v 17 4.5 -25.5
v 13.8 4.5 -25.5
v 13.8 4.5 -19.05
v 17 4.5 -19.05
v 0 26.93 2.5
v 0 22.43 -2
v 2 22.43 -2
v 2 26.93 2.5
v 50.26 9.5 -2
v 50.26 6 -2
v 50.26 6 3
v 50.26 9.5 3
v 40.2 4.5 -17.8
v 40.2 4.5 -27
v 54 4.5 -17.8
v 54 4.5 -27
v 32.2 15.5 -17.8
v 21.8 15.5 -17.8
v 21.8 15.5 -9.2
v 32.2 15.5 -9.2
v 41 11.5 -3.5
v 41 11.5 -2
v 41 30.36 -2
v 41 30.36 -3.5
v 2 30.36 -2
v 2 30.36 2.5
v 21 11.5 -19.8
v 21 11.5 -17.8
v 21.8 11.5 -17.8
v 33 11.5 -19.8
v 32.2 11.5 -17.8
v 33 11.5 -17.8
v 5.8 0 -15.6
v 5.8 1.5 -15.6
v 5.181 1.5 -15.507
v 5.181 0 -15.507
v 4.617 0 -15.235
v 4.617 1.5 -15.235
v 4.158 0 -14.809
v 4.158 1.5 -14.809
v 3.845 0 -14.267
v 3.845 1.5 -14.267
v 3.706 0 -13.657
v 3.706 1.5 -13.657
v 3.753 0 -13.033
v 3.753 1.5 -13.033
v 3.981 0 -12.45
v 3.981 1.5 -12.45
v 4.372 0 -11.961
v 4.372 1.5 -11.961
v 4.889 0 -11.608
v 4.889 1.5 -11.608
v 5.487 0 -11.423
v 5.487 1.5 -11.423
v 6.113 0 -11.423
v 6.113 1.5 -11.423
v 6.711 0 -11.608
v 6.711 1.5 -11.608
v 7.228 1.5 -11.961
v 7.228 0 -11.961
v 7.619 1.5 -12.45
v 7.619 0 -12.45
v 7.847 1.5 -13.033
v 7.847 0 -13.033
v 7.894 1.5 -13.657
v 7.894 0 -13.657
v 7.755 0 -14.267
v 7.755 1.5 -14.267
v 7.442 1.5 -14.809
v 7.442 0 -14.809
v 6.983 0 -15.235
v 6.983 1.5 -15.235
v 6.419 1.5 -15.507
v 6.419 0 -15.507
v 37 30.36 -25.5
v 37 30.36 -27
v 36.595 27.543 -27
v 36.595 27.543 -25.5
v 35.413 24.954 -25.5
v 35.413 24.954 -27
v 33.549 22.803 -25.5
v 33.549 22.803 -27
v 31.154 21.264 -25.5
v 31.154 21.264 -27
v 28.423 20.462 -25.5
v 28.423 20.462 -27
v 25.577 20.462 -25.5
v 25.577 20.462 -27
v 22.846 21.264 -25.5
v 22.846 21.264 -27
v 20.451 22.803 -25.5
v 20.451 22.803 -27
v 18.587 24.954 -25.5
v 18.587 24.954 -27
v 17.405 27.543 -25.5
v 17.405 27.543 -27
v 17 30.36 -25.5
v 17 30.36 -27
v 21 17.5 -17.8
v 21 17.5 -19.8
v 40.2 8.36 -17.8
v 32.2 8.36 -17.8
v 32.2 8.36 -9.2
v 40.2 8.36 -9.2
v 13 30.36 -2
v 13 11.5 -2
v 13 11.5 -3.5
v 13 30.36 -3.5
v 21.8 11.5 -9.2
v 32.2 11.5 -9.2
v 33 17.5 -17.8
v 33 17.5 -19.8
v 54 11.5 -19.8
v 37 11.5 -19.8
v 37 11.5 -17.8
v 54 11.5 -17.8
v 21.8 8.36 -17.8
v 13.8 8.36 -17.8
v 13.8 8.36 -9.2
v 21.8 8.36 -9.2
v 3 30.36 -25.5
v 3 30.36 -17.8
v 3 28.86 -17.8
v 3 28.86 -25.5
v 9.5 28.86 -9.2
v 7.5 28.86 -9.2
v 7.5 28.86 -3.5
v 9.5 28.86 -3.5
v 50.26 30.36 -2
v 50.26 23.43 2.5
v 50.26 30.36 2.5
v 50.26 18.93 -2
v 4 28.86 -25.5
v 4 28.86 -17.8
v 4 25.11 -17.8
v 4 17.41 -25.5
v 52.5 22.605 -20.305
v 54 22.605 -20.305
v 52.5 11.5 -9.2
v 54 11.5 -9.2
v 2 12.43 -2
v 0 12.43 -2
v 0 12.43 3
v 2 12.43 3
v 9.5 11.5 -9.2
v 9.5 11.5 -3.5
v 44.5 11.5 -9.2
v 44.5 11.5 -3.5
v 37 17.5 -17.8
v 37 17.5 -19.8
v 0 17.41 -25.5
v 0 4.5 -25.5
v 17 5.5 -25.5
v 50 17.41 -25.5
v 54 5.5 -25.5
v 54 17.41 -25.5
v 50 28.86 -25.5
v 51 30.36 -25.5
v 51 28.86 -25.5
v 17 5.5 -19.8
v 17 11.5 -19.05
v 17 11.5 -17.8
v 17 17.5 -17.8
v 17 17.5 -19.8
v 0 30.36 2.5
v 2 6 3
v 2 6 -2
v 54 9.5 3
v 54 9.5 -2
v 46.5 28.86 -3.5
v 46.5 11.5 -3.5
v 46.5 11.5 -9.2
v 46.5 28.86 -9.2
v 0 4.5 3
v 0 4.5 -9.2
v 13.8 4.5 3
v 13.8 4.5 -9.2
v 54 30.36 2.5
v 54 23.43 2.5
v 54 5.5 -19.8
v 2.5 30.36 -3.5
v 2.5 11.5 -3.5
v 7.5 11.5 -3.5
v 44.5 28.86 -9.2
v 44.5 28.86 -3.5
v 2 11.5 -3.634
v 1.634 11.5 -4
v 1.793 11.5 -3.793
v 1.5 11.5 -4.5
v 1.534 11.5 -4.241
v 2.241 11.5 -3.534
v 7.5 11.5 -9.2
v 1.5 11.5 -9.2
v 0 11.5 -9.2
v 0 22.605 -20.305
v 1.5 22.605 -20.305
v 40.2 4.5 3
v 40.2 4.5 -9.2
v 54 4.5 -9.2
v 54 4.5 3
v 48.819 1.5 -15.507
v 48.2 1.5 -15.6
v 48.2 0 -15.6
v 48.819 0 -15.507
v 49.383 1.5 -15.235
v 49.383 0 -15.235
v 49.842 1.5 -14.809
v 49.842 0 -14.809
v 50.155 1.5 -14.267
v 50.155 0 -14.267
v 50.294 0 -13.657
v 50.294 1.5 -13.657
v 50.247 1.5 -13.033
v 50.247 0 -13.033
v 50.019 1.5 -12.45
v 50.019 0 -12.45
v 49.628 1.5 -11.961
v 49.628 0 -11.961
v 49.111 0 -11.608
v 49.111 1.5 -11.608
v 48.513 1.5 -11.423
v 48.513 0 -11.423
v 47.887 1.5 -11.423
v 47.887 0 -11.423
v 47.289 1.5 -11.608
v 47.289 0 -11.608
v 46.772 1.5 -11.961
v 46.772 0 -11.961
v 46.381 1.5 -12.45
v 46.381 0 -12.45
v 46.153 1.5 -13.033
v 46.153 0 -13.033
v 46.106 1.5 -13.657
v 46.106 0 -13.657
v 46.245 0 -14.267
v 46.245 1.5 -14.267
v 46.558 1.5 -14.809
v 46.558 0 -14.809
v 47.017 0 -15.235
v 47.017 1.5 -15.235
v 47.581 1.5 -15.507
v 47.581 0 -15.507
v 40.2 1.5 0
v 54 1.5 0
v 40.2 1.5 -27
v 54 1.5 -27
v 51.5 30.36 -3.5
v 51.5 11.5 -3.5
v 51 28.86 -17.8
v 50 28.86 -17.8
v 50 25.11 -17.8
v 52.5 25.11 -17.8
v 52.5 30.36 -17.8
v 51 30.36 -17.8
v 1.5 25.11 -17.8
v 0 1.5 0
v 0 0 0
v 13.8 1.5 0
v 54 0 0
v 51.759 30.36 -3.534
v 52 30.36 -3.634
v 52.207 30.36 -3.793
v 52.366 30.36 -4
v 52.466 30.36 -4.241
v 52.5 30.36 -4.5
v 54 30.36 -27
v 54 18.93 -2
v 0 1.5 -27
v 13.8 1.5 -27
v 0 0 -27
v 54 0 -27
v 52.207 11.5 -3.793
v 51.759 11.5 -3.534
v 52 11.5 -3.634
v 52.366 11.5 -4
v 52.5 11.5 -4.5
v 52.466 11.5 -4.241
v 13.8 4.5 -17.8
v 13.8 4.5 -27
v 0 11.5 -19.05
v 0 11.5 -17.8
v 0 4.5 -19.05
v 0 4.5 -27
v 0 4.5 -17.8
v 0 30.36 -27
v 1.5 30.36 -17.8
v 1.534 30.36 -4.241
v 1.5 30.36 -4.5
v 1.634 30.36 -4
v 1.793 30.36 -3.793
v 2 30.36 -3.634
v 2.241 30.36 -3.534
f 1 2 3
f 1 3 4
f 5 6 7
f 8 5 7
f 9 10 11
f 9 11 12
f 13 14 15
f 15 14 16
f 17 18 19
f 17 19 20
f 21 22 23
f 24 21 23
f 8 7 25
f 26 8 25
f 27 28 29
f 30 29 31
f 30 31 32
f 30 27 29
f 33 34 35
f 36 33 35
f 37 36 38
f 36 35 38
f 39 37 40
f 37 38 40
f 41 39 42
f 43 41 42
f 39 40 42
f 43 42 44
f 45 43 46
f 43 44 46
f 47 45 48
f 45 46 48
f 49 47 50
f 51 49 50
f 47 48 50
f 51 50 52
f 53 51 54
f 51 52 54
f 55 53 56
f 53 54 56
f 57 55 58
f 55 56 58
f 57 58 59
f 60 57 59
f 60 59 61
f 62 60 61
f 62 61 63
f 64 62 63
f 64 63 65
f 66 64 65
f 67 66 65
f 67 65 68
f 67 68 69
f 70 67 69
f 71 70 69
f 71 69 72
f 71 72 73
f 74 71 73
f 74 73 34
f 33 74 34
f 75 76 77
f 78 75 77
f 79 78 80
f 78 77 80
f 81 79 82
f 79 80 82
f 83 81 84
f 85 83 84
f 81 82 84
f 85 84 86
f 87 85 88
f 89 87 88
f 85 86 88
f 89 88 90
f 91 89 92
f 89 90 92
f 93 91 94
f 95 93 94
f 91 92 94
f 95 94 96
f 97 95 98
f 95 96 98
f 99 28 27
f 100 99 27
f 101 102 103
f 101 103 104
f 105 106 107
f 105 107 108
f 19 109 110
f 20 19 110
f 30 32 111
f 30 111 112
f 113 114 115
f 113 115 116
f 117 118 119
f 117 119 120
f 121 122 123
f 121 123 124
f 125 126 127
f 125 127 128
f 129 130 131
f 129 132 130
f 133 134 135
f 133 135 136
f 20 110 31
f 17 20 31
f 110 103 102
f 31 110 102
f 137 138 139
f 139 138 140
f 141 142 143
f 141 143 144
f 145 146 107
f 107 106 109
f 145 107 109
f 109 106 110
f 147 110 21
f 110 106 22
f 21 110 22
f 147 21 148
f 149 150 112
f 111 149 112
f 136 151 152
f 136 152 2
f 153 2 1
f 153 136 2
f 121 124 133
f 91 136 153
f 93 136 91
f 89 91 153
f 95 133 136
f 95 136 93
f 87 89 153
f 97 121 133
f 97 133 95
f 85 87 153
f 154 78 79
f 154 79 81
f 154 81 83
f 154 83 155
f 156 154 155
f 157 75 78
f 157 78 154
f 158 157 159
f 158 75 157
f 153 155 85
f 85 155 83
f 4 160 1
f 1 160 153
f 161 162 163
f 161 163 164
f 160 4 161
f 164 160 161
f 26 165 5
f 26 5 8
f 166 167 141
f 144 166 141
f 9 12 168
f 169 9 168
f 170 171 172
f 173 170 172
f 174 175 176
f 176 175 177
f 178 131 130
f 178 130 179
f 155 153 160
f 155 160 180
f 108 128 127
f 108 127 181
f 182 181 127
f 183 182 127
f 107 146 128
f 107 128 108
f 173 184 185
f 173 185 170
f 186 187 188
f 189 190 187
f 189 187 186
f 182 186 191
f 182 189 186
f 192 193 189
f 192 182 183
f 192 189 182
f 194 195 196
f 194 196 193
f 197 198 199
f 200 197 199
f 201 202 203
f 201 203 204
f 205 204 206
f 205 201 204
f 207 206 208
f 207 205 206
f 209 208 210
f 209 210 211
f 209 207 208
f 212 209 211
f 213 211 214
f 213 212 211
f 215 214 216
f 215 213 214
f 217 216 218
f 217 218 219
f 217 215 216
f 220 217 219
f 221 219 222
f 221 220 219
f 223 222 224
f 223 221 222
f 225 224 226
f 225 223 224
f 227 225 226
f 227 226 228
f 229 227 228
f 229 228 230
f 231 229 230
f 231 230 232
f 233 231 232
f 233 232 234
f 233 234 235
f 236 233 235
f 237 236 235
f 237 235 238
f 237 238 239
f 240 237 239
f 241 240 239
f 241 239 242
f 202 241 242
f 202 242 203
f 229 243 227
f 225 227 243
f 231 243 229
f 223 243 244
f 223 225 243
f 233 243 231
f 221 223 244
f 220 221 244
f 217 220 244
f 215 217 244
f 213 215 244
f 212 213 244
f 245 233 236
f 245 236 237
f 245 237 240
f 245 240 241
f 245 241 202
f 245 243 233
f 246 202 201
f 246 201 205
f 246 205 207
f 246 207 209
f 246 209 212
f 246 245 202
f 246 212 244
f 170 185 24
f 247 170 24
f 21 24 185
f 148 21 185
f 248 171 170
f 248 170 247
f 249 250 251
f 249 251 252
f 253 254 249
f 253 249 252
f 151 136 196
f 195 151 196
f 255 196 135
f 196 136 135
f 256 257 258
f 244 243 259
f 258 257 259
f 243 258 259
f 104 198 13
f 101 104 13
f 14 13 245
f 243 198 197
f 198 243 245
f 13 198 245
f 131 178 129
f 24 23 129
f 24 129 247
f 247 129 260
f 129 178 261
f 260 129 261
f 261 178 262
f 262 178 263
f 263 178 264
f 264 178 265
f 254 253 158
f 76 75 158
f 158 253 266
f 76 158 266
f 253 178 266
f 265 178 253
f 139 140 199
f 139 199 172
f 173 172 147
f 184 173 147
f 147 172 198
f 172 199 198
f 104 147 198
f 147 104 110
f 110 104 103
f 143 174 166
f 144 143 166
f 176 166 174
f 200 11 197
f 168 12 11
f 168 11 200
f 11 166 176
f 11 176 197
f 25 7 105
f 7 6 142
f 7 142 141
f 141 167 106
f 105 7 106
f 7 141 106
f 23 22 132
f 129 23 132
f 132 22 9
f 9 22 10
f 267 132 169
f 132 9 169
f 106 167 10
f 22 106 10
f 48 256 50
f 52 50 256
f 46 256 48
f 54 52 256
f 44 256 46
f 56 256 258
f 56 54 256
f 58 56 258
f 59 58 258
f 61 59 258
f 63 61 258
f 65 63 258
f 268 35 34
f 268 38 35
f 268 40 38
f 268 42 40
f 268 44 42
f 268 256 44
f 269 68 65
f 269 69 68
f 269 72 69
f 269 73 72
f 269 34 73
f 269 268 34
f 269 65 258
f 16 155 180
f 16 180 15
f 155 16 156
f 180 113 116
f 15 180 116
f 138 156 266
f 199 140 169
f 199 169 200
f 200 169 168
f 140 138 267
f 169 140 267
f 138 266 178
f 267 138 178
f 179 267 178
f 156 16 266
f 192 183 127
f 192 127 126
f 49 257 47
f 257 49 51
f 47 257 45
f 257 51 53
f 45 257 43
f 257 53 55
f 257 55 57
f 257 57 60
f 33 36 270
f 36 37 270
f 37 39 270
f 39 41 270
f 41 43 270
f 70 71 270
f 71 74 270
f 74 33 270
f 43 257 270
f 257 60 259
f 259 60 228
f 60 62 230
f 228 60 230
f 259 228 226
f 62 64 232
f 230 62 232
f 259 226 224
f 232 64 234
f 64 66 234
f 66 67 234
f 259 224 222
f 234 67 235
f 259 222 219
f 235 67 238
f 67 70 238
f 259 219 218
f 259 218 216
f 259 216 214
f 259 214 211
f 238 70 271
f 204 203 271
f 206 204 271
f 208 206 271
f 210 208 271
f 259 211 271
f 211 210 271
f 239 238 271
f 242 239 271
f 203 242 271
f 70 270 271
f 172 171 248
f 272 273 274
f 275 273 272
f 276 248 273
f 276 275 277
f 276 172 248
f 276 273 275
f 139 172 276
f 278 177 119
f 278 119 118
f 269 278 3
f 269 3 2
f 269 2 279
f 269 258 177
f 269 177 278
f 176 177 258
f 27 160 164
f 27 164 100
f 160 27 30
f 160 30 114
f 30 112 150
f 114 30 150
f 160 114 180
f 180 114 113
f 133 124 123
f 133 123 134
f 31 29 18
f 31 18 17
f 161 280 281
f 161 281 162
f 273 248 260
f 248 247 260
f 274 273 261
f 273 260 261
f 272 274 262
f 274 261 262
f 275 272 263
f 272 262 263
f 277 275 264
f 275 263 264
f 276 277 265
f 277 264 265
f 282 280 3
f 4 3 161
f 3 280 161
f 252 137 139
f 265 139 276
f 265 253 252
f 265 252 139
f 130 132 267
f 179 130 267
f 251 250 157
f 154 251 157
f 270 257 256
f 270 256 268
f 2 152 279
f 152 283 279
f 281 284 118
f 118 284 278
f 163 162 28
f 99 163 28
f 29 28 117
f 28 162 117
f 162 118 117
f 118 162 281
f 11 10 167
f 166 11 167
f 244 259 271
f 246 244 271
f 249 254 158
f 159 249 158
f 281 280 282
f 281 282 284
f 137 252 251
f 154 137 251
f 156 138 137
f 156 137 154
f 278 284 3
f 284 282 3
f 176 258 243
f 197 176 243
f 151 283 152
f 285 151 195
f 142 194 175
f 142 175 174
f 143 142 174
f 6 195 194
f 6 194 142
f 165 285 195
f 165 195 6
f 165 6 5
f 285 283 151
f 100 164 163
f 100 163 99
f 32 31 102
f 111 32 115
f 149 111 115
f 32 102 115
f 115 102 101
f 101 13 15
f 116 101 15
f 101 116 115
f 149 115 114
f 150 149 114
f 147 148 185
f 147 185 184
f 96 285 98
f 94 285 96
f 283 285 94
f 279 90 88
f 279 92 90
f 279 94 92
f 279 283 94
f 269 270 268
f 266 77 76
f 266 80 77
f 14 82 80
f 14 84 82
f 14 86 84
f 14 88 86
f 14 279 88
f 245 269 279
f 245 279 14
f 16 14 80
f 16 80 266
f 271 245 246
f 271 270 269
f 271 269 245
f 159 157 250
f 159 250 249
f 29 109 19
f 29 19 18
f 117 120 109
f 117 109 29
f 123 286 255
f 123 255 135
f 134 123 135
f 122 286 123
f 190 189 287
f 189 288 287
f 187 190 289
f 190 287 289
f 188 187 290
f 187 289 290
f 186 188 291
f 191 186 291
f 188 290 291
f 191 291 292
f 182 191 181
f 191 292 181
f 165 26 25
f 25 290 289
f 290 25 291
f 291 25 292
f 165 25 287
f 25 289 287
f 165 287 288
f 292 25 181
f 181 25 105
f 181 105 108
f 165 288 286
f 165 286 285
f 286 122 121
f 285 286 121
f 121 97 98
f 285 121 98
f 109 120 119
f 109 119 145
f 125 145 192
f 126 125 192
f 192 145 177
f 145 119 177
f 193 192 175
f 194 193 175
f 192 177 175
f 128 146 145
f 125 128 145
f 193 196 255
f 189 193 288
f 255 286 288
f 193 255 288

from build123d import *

# Parameters (mm, degrees)
SKETCH1_W                      = 54
SKETCH1_H                      = 27
BOSS_EXTRUDE1_DEPTH            = 1.5
CUT_EXTRUDE1_REACH             = 62.392
SKETCH2_R                      = 2.1
CUT_EXTRUDE1_DIRECTION_2_DEPTH = 61.392466418
SKETCH3_W                      = 26.4
SKETCH3_H                      = 30
BOSS_EXTRUDE2_DEPTH            = 3
CHAMFER3_SIZE                  = 3
BOSS_EXTRUDE3_DEPTH            = 7
BOSS_EXTRUDE15_START           = 7
SKETCH4_4_W                    = 10.4
SKETCH4_4_H                    = 8.6
BOSS_EXTRUDE15_DEPTH           = 4
SKETCH5_W                      = 54
SKETCH5_H                      = 1.5
BOSS_EXTRUDE5_DEPTH            = 18.86
SKETCH5_3_W                    = 2
SKETCH5_3_H                    = 5.7
BOSS_EXTRUDE6_DEPTH            = 17.36
SKETCH4_3_W                    = 8
SKETCH4_3_H                    = 8.6
BOSS_EXTRUDE12_DEPTH           = 3.86
SKETCH17_W                     = 2
SKETCH17_H                     = 6.43
SKETCH17_W_2                   = 3.74
SKETCH17_H_2                   = 3.5
BOSS_EXTRUDE13_DEPTH           = 5
SKETCH17_3_W                   = 2
SKETCH17_3_H                   = 7.93
SKETCH17_3_W_2                 = 3.74
SKETCH17_3_H_2                 = 11.43
BOSS_EXTRUDE16_DEPTH           = 4.5
CHAMFER7_SIZE                  = 4.5
SKETCH5_4_W                    = 54
SKETCH5_4_H                    = 1.5
BOSS_EXTRUDE8_DEPTH            = 18.86
BOSS_EXTRUDE9_DEPTH            = 1.5
SKETCH18_W                     = 4
SKETCH18_H                     = 7.7
BOSS_EXTRUDE14_DEPTH           = 13
CHAMFER6_SIZE                  = 7.75
SKETCH20_W                     = 1
SKETCH20_H                     = 7.7
CUT_EXTRUDE7_DEPTH             = 1.5
SKETCH12_W                     = 28
SKETCH12_H                     = 18.86
CUT_EXTRUDE2_DEPTH             = 7.2
SKETCH14_R                     = 10
CUT_EXTRUDE3_DEPTH             = 10
SKETCH15_W                     = 4
SKETCH15_H                     = 2
BOSS_EXTRUDE11_DEPTH           = 6
SKETCH21_W                     = 17
SKETCH21_H                     = 5.7
SKETCH21_H_2                   = 0.75
CUT_EXTRUDE8_DEPTH             = 6
CUT_EXTRUDE9_START             = -6
SKETCH21_3_W                   = 17
SKETCH21_3_H                   = 5.7
SKETCH21_3_H_2                 = 0.75
CUT_EXTRUDE9_DEPTH             = 1
FILLET7_R                      = 1


# Some blends are built 0.0001 mm under size
with BuildPart() as part:
    # Sketch1 → Boss-Extrude1 (new body)
    with BuildSketch(Plane(origin=(0, 0, 0), x_dir=(1, 0, 0), z_dir=(0, 1, 0))):
        with Locations((27, 13.5)):
            Rectangle(SKETCH1_W, SKETCH1_H)
    extrude(amount=BOSS_EXTRUDE1_DEPTH)

    # Sketch2 → Cut-Extrude1 (cut, up to next)
    with BuildSketch(Plane(origin=(0, 1.5, 0), x_dir=(1, 0, 0), z_dir=(0, 1, 0)), mode=Mode.PRIVATE) as cut_extrude1_sk1:
        with Locations(Location((5.8, 13.5, 0), (0, 0, 90))):
            Circle(SKETCH2_R)
    cut_extrude1_tool1 = extrude(cut_extrude1_sk1.sketch, amount=-CUT_EXTRUDE1_REACH, mode=Mode.PRIVATE) & part.part
    cut_extrude1 = cut_extrude1_tool1.solids().sort_by_distance((5.8, 1.5, -13.5))[0]
    add(cut_extrude1, mode=Mode.SUBTRACT)

    # Sketch2 → Cut-Extrude1 direction 2 (cut)
    with BuildSketch(Plane(origin=(0, 1.5, 0), x_dir=(1, 0, 0), z_dir=(0, 1, 0))):
        with Locations(Location((5.8, 13.5, 0), (0, 0, 90))):
            Circle(SKETCH2_R)
    cut_extrude1_direction_2 = extrude(amount=CUT_EXTRUDE1_DIRECTION_2_DEPTH, mode=Mode.SUBTRACT)

    # Mirror1: Cut-Extrude1, Cut-Extrude1 direction 2 across plane
    add(cut_extrude1.mirror(Plane.ZY.offset(-27)), mode=Mode.SUBTRACT)
    add(cut_extrude1_direction_2.mirror(Plane.ZY.offset(-27)), mode=Mode.SUBTRACT)

    # Sketch3 → Boss-Extrude2 (add)
    with BuildSketch(Plane(origin=(0, 1.5, 0), x_dir=(1, 0, 0), z_dir=(0, 1, 0))):
        with Locations((27, 12)):
            Rectangle(SKETCH3_W, SKETCH3_H)
    extrude(amount=BOSS_EXTRUDE2_DEPTH)

    # Chamfer3
    chamfer3_edges = [part.edges().sort_by_distance(p)[0] for p in [
        (27, 1.5, 3),
    ]]
    chamfer(chamfer3_edges, length=CHAMFER3_SIZE - 0.0001)  # a hair under: the kernel refuses the full size

    # Sketch4 → Boss-Extrude3 (add)
    with BuildSketch(Plane(origin=(0, 4.5, 0), x_dir=(1, 0, 0), z_dir=(0, 1, 0))):
        Polygon((54, 27), (0, 27), (0, 17.8), (21.8, 17.8), (21.8, 9.2), (0, 9.2), (0, 2), (54, 2), (54, 9.2), (32.2, 9.2), (32.2, 17.8), (54, 17.8), align=None)
    extrude(amount=BOSS_EXTRUDE3_DEPTH)

    # Sketch4<4> → Boss-Extrude15 (add)
    with BuildSketch(Plane(origin=(0, 4.5, 0), x_dir=(1, 0, 0), z_dir=(0, 1, 0)).offset(BOSS_EXTRUDE15_START)):
        with Locations((27, 13.5)):
            Rectangle(SKETCH4_4_W, SKETCH4_4_H)
    extrude(amount=BOSS_EXTRUDE15_DEPTH)

    # Sketch5 → Boss-Extrude5 (add)
    with BuildSketch(Plane(origin=(0, 11.5, 0), x_dir=(1, 0, 0), z_dir=(0, 1, 0))):
        with Locations((27, 2.75)):
            Rectangle(SKETCH5_W, SKETCH5_H)
    extrude(amount=BOSS_EXTRUDE5_DEPTH)

    # Sketch5<3> → Boss-Extrude6 (add)
    with BuildSketch(Plane(origin=(0, 11.5, 0), x_dir=(1, 0, 0), z_dir=(0, 1, 0))):
        with Locations((45.5, 6.35)):
            Rectangle(SKETCH5_3_W, SKETCH5_3_H)
        with Locations((8.5, 6.35)):
            Rectangle(SKETCH5_3_W, SKETCH5_3_H)
    extrude(amount=BOSS_EXTRUDE6_DEPTH)

    # Sketch4<3> → Boss-Extrude12 (add)
    with BuildSketch(Plane(origin=(0, 4.5, 0), x_dir=(1, 0, 0), z_dir=(0, 1, 0))):
        with Locations((17.8, 13.5)):
            Rectangle(SKETCH4_3_W, SKETCH4_3_H)
        with Locations((36.2, 13.5)):
            Rectangle(SKETCH4_3_W, SKETCH4_3_H)
    extrude(amount=BOSS_EXTRUDE12_DEPTH)

    # Sketch17 → Boss-Extrude13 (add)
    with BuildSketch(Plane.XY.offset(-2)):
        with Locations((1, 9.215)):
            Rectangle(SKETCH17_W, SKETCH17_H)
        Polygon((0, 6), (0, 4.5), (13.8, 4.5), (40.2, 4.5), (54, 4.5), (54, 6), (50.26, 6), (2, 6), align=None)
        with Locations((52.13, 7.75)):
            Rectangle(SKETCH17_W_2, SKETCH17_H_2)
    extrude(amount=BOSS_EXTRUDE13_DEPTH)

    # Sketch17<3> → Boss-Extrude16 (add)
    with BuildSketch(Plane.XY.offset(-2)):
        with Locations((1, 26.395)):
            Rectangle(SKETCH17_3_W, SKETCH17_3_H)
        with Locations((52.13, 24.645)):
            Rectangle(SKETCH17_3_W_2, SKETCH17_3_H_2)
    extrude(amount=BOSS_EXTRUDE16_DEPTH)

    # Chamfer7
    chamfer7_edges = [part.edges().sort_by_distance(p)[0] for p in [
        (52.13, 18.93, 2.5),
        (1, 22.43, 2.5),
    ]]
    chamfer(chamfer7_edges, length=CHAMFER7_SIZE - 0.0001)  # a hair under: the kernel refuses the full size

    # Sketch5<4> → Boss-Extrude8 (add)
    with BuildSketch(Plane(origin=(0, 11.5, 0), x_dir=(1, 0, 0), z_dir=(0, 1, 0))):
        with Locations((27, 26.25)):
            Rectangle(SKETCH5_4_W, SKETCH5_4_H)
    extrude(amount=BOSS_EXTRUDE8_DEPTH)

    # Sketch10 → Boss-Extrude9 (add)
    with BuildSketch(Plane.ZY):
        Polygon((-3.5, 11.5), (-3.5, 30.36), (-25.5, 30.36), (-25.5, 27.8), (-9.2, 11.5), align=None)
    boss_extrude9 = extrude(amount=-BOSS_EXTRUDE9_DEPTH)

    # Mirror3: Boss-Extrude9 across plane
    add(boss_extrude9.mirror(Plane.ZY.offset(-27)))

    # Sketch18 → Boss-Extrude14 (add)
    with BuildSketch(Plane(origin=(0, 30.36, 0), x_dir=(1, 0, 0), z_dir=(0, 1, 0))):
        with Locations((2, 21.65)):
            Rectangle(SKETCH18_W, SKETCH18_H)
        with Locations((52, 21.65)):
            Rectangle(SKETCH18_W, SKETCH18_H)
    extrude(amount=-BOSS_EXTRUDE14_DEPTH)

    # Chamfer6
    # the kernel refuses this chamfer: 7.75 mm, written as the material it takes off along each edge
    with BuildSketch(Plane(origin=(23.930543157, 17.36, -17.8), x_dir=(0, -0.027495876610586188, -0.9996219169112968), z_dir=(-1, 0, 0))) as chamfer6_piece_1_section:
        Polygon((CHAMFER6_SIZE * 0.999621916911, -CHAMFER6_SIZE * 0.0274958766106), (-CHAMFER6_SIZE * 0.0274958766106, -CHAMFER6_SIZE * 0.999621916911), (0, 0), align=None)
    chamfer6_piece_1 = extrude(amount=43.861086313, mode=Mode.PRIVATE)
    chamfer6_piece_1 = split(chamfer6_piece_1, bisect_by=Plane(origin=(2.75, 21.192634452, -18.892634452), z_dir=(0, -0.7071067811865515, -0.7071067811865436)), keep=Keep.TOP, mode=Mode.PRIVATE)
    chamfer6_piece_1 = split(chamfer6_piece_1, bisect_by=Plane(origin=(2.75, 19.24037252, -25.5), z_dir=(0, 0, 1)), keep=Keep.TOP, mode=Mode.PRIVATE)
    add(chamfer6_piece_1, mode=Mode.SUBTRACT)
    with BuildSketch(Plane(origin=(23.930543157, 17.36, -17.8), x_dir=(0, -0.027495876610586188, -0.9996219169112968), z_dir=(-1, 0, 0))) as chamfer6_piece_2_section:
        Polygon((CHAMFER6_SIZE * 0.999621916911, -CHAMFER6_SIZE * 0.0274958766106), (-CHAMFER6_SIZE * 0.0274958766106, -CHAMFER6_SIZE * 0.999621916911), (0, 0), align=None)
    chamfer6_piece_2 = extrude(amount=43.861086313, mode=Mode.PRIVATE)
    chamfer6_piece_2 = split(chamfer6_piece_2, bisect_by=Plane(origin=(1.5, 22.605, -18.635), z_dir=(1, 0, 0)), keep=Keep.TOP, mode=Mode.PRIVATE)
    chamfer6_piece_2 = split(chamfer6_piece_2, bisect_by=Plane(origin=(2.75, 22.605, -25.5), z_dir=(0, 0, 1)), keep=Keep.TOP, mode=Mode.PRIVATE)
    add(chamfer6_piece_2, mode=Mode.SUBTRACT)
    with BuildSketch(Plane(origin=(73.930543157, 17.36, -17.8), x_dir=(0, 0.9996219169112968, 0.027495876610586188), z_dir=(-1, 0, 0))) as chamfer6_piece_3_section:
        Polygon((CHAMFER6_SIZE * 0.999621916911, CHAMFER6_SIZE * 0.0274958766106), (-CHAMFER6_SIZE * 0.0274958766106, CHAMFER6_SIZE * 0.999621916911), (0, 0), align=None)
    chamfer6_piece_3 = extrude(amount=43.861086313, mode=Mode.PRIVATE)
    chamfer6_piece_3 = split(chamfer6_piece_3, bisect_by=Plane(origin=(53.25, 21.192634452, -18.892634452), z_dir=(0, -0.7071067811865515, -0.7071067811865436)), keep=Keep.TOP, mode=Mode.PRIVATE)
    chamfer6_piece_3 = split(chamfer6_piece_3, bisect_by=Plane(origin=(53.25, 19.24037252, -25.5), z_dir=(0, 0, 1)), keep=Keep.TOP, mode=Mode.PRIVATE)
    add(chamfer6_piece_3, mode=Mode.SUBTRACT)
    with BuildSketch(Plane(origin=(73.930543157, 17.36, -17.8), x_dir=(0, 0.9996219169112968, 0.027495876610586188), z_dir=(-1, 0, 0))) as chamfer6_piece_4_section:
        Polygon((CHAMFER6_SIZE * 0.999621916911, CHAMFER6_SIZE * 0.0274958766106), (-CHAMFER6_SIZE * 0.0274958766106, CHAMFER6_SIZE * 0.999621916911), (0, 0), align=None)
    chamfer6_piece_4 = extrude(amount=43.861086313, mode=Mode.PRIVATE)
    chamfer6_piece_4 = split(chamfer6_piece_4, bisect_by=Plane(origin=(52.5, 22.605, -18.635), z_dir=(-1, 0, 0)), keep=Keep.TOP, mode=Mode.PRIVATE)
    chamfer6_piece_4 = split(chamfer6_piece_4, bisect_by=Plane(origin=(51.25, 22.605, -25.5), z_dir=(0, 0, 1)), keep=Keep.TOP, mode=Mode.PRIVATE)
    add(chamfer6_piece_4, mode=Mode.SUBTRACT)

    # Sketch20 → Cut-Extrude7 (cut)
    with BuildSketch(Plane(origin=(0, 30.36, 0), x_dir=(1, 0, 0), z_dir=(0, 1, 0))):
        with Locations((3.5, 21.65)):
            Rectangle(SKETCH20_W, SKETCH20_H)
        with Locations((50.5, 21.65)):
            Rectangle(SKETCH20_W, SKETCH20_H)
    extrude(amount=-CUT_EXTRUDE7_DEPTH, mode=Mode.SUBTRACT)

    # Sketch12 → Cut-Extrude2 (cut)
    with BuildSketch(Plane.XY.offset(-2)):
        with Locations((27, 20.93)):
            Rectangle(SKETCH12_W, SKETCH12_H)
    extrude(amount=-CUT_EXTRUDE2_DEPTH, mode=Mode.SUBTRACT)

    # Sketch14 → Cut-Extrude3 (cut)
    with BuildSketch(Plane(origin=(0, 0, -27), x_dir=(-1, 0, 0), z_dir=(0, 0, -1))):
        with Locations((-27, 30.36)):
            Circle(SKETCH14_R)
    extrude(amount=-CUT_EXTRUDE3_DEPTH, mode=Mode.SUBTRACT)

    # Sketch15 → Boss-Extrude11 (add)
    with BuildSketch(Plane(origin=(0, 11.5, 0), x_dir=(1, 0, 0), z_dir=(0, 1, 0))):
        with Locations((19, 18.8)):
            Rectangle(SKETCH15_W, SKETCH15_H)
    boss_extrude11 = extrude(amount=BOSS_EXTRUDE11_DEPTH)

    # Mirror5: Boss-Extrude11 across plane
    add(boss_extrude11.mirror(Plane.ZY.offset(-27)))

    # Sketch21 → Cut-Extrude8 (cut)
    with BuildSketch(Plane(origin=(0, 11.5, 0), x_dir=(1, 0, 0), z_dir=(0, 1, 0))):
        Polygon((54, 25.5), (17, 25.5), (17, 19.8), (21, 19.8), (33, 19.8), (37, 19.8), (54, 19.8), align=None)
        with Locations((8.5, 22.65)):
            Rectangle(SKETCH21_W, SKETCH21_H)
        with Locations((8.5, 19.425)):
            Rectangle(SKETCH21_W, SKETCH21_H_2)
    extrude(amount=-CUT_EXTRUDE8_DEPTH, mode=Mode.SUBTRACT)

    # Sketch21<3> → Cut-Extrude9 (cut)
    with BuildSketch(Plane(origin=(0, 11.5, 0), x_dir=(1, 0, 0), z_dir=(0, 1, 0)).offset(CUT_EXTRUDE9_START)):
        with Locations((8.5, 22.65)):
            Rectangle(SKETCH21_3_W, SKETCH21_3_H)
        with Locations((8.5, 19.425)):
            Rectangle(SKETCH21_3_W, SKETCH21_3_H_2)
    extrude(amount=-CUT_EXTRUDE9_DEPTH, mode=Mode.SUBTRACT)

    # Fillet7
    fillet7_edges = [part.edges().sort_by_distance(p)[0] for p in [
        (1.5, 20.93, -3.5),
        (52.5, 20.93, -3.5),
    ]]
    fillet(fillet7_edges, radius=FILLET7_R)


solid = part.part
